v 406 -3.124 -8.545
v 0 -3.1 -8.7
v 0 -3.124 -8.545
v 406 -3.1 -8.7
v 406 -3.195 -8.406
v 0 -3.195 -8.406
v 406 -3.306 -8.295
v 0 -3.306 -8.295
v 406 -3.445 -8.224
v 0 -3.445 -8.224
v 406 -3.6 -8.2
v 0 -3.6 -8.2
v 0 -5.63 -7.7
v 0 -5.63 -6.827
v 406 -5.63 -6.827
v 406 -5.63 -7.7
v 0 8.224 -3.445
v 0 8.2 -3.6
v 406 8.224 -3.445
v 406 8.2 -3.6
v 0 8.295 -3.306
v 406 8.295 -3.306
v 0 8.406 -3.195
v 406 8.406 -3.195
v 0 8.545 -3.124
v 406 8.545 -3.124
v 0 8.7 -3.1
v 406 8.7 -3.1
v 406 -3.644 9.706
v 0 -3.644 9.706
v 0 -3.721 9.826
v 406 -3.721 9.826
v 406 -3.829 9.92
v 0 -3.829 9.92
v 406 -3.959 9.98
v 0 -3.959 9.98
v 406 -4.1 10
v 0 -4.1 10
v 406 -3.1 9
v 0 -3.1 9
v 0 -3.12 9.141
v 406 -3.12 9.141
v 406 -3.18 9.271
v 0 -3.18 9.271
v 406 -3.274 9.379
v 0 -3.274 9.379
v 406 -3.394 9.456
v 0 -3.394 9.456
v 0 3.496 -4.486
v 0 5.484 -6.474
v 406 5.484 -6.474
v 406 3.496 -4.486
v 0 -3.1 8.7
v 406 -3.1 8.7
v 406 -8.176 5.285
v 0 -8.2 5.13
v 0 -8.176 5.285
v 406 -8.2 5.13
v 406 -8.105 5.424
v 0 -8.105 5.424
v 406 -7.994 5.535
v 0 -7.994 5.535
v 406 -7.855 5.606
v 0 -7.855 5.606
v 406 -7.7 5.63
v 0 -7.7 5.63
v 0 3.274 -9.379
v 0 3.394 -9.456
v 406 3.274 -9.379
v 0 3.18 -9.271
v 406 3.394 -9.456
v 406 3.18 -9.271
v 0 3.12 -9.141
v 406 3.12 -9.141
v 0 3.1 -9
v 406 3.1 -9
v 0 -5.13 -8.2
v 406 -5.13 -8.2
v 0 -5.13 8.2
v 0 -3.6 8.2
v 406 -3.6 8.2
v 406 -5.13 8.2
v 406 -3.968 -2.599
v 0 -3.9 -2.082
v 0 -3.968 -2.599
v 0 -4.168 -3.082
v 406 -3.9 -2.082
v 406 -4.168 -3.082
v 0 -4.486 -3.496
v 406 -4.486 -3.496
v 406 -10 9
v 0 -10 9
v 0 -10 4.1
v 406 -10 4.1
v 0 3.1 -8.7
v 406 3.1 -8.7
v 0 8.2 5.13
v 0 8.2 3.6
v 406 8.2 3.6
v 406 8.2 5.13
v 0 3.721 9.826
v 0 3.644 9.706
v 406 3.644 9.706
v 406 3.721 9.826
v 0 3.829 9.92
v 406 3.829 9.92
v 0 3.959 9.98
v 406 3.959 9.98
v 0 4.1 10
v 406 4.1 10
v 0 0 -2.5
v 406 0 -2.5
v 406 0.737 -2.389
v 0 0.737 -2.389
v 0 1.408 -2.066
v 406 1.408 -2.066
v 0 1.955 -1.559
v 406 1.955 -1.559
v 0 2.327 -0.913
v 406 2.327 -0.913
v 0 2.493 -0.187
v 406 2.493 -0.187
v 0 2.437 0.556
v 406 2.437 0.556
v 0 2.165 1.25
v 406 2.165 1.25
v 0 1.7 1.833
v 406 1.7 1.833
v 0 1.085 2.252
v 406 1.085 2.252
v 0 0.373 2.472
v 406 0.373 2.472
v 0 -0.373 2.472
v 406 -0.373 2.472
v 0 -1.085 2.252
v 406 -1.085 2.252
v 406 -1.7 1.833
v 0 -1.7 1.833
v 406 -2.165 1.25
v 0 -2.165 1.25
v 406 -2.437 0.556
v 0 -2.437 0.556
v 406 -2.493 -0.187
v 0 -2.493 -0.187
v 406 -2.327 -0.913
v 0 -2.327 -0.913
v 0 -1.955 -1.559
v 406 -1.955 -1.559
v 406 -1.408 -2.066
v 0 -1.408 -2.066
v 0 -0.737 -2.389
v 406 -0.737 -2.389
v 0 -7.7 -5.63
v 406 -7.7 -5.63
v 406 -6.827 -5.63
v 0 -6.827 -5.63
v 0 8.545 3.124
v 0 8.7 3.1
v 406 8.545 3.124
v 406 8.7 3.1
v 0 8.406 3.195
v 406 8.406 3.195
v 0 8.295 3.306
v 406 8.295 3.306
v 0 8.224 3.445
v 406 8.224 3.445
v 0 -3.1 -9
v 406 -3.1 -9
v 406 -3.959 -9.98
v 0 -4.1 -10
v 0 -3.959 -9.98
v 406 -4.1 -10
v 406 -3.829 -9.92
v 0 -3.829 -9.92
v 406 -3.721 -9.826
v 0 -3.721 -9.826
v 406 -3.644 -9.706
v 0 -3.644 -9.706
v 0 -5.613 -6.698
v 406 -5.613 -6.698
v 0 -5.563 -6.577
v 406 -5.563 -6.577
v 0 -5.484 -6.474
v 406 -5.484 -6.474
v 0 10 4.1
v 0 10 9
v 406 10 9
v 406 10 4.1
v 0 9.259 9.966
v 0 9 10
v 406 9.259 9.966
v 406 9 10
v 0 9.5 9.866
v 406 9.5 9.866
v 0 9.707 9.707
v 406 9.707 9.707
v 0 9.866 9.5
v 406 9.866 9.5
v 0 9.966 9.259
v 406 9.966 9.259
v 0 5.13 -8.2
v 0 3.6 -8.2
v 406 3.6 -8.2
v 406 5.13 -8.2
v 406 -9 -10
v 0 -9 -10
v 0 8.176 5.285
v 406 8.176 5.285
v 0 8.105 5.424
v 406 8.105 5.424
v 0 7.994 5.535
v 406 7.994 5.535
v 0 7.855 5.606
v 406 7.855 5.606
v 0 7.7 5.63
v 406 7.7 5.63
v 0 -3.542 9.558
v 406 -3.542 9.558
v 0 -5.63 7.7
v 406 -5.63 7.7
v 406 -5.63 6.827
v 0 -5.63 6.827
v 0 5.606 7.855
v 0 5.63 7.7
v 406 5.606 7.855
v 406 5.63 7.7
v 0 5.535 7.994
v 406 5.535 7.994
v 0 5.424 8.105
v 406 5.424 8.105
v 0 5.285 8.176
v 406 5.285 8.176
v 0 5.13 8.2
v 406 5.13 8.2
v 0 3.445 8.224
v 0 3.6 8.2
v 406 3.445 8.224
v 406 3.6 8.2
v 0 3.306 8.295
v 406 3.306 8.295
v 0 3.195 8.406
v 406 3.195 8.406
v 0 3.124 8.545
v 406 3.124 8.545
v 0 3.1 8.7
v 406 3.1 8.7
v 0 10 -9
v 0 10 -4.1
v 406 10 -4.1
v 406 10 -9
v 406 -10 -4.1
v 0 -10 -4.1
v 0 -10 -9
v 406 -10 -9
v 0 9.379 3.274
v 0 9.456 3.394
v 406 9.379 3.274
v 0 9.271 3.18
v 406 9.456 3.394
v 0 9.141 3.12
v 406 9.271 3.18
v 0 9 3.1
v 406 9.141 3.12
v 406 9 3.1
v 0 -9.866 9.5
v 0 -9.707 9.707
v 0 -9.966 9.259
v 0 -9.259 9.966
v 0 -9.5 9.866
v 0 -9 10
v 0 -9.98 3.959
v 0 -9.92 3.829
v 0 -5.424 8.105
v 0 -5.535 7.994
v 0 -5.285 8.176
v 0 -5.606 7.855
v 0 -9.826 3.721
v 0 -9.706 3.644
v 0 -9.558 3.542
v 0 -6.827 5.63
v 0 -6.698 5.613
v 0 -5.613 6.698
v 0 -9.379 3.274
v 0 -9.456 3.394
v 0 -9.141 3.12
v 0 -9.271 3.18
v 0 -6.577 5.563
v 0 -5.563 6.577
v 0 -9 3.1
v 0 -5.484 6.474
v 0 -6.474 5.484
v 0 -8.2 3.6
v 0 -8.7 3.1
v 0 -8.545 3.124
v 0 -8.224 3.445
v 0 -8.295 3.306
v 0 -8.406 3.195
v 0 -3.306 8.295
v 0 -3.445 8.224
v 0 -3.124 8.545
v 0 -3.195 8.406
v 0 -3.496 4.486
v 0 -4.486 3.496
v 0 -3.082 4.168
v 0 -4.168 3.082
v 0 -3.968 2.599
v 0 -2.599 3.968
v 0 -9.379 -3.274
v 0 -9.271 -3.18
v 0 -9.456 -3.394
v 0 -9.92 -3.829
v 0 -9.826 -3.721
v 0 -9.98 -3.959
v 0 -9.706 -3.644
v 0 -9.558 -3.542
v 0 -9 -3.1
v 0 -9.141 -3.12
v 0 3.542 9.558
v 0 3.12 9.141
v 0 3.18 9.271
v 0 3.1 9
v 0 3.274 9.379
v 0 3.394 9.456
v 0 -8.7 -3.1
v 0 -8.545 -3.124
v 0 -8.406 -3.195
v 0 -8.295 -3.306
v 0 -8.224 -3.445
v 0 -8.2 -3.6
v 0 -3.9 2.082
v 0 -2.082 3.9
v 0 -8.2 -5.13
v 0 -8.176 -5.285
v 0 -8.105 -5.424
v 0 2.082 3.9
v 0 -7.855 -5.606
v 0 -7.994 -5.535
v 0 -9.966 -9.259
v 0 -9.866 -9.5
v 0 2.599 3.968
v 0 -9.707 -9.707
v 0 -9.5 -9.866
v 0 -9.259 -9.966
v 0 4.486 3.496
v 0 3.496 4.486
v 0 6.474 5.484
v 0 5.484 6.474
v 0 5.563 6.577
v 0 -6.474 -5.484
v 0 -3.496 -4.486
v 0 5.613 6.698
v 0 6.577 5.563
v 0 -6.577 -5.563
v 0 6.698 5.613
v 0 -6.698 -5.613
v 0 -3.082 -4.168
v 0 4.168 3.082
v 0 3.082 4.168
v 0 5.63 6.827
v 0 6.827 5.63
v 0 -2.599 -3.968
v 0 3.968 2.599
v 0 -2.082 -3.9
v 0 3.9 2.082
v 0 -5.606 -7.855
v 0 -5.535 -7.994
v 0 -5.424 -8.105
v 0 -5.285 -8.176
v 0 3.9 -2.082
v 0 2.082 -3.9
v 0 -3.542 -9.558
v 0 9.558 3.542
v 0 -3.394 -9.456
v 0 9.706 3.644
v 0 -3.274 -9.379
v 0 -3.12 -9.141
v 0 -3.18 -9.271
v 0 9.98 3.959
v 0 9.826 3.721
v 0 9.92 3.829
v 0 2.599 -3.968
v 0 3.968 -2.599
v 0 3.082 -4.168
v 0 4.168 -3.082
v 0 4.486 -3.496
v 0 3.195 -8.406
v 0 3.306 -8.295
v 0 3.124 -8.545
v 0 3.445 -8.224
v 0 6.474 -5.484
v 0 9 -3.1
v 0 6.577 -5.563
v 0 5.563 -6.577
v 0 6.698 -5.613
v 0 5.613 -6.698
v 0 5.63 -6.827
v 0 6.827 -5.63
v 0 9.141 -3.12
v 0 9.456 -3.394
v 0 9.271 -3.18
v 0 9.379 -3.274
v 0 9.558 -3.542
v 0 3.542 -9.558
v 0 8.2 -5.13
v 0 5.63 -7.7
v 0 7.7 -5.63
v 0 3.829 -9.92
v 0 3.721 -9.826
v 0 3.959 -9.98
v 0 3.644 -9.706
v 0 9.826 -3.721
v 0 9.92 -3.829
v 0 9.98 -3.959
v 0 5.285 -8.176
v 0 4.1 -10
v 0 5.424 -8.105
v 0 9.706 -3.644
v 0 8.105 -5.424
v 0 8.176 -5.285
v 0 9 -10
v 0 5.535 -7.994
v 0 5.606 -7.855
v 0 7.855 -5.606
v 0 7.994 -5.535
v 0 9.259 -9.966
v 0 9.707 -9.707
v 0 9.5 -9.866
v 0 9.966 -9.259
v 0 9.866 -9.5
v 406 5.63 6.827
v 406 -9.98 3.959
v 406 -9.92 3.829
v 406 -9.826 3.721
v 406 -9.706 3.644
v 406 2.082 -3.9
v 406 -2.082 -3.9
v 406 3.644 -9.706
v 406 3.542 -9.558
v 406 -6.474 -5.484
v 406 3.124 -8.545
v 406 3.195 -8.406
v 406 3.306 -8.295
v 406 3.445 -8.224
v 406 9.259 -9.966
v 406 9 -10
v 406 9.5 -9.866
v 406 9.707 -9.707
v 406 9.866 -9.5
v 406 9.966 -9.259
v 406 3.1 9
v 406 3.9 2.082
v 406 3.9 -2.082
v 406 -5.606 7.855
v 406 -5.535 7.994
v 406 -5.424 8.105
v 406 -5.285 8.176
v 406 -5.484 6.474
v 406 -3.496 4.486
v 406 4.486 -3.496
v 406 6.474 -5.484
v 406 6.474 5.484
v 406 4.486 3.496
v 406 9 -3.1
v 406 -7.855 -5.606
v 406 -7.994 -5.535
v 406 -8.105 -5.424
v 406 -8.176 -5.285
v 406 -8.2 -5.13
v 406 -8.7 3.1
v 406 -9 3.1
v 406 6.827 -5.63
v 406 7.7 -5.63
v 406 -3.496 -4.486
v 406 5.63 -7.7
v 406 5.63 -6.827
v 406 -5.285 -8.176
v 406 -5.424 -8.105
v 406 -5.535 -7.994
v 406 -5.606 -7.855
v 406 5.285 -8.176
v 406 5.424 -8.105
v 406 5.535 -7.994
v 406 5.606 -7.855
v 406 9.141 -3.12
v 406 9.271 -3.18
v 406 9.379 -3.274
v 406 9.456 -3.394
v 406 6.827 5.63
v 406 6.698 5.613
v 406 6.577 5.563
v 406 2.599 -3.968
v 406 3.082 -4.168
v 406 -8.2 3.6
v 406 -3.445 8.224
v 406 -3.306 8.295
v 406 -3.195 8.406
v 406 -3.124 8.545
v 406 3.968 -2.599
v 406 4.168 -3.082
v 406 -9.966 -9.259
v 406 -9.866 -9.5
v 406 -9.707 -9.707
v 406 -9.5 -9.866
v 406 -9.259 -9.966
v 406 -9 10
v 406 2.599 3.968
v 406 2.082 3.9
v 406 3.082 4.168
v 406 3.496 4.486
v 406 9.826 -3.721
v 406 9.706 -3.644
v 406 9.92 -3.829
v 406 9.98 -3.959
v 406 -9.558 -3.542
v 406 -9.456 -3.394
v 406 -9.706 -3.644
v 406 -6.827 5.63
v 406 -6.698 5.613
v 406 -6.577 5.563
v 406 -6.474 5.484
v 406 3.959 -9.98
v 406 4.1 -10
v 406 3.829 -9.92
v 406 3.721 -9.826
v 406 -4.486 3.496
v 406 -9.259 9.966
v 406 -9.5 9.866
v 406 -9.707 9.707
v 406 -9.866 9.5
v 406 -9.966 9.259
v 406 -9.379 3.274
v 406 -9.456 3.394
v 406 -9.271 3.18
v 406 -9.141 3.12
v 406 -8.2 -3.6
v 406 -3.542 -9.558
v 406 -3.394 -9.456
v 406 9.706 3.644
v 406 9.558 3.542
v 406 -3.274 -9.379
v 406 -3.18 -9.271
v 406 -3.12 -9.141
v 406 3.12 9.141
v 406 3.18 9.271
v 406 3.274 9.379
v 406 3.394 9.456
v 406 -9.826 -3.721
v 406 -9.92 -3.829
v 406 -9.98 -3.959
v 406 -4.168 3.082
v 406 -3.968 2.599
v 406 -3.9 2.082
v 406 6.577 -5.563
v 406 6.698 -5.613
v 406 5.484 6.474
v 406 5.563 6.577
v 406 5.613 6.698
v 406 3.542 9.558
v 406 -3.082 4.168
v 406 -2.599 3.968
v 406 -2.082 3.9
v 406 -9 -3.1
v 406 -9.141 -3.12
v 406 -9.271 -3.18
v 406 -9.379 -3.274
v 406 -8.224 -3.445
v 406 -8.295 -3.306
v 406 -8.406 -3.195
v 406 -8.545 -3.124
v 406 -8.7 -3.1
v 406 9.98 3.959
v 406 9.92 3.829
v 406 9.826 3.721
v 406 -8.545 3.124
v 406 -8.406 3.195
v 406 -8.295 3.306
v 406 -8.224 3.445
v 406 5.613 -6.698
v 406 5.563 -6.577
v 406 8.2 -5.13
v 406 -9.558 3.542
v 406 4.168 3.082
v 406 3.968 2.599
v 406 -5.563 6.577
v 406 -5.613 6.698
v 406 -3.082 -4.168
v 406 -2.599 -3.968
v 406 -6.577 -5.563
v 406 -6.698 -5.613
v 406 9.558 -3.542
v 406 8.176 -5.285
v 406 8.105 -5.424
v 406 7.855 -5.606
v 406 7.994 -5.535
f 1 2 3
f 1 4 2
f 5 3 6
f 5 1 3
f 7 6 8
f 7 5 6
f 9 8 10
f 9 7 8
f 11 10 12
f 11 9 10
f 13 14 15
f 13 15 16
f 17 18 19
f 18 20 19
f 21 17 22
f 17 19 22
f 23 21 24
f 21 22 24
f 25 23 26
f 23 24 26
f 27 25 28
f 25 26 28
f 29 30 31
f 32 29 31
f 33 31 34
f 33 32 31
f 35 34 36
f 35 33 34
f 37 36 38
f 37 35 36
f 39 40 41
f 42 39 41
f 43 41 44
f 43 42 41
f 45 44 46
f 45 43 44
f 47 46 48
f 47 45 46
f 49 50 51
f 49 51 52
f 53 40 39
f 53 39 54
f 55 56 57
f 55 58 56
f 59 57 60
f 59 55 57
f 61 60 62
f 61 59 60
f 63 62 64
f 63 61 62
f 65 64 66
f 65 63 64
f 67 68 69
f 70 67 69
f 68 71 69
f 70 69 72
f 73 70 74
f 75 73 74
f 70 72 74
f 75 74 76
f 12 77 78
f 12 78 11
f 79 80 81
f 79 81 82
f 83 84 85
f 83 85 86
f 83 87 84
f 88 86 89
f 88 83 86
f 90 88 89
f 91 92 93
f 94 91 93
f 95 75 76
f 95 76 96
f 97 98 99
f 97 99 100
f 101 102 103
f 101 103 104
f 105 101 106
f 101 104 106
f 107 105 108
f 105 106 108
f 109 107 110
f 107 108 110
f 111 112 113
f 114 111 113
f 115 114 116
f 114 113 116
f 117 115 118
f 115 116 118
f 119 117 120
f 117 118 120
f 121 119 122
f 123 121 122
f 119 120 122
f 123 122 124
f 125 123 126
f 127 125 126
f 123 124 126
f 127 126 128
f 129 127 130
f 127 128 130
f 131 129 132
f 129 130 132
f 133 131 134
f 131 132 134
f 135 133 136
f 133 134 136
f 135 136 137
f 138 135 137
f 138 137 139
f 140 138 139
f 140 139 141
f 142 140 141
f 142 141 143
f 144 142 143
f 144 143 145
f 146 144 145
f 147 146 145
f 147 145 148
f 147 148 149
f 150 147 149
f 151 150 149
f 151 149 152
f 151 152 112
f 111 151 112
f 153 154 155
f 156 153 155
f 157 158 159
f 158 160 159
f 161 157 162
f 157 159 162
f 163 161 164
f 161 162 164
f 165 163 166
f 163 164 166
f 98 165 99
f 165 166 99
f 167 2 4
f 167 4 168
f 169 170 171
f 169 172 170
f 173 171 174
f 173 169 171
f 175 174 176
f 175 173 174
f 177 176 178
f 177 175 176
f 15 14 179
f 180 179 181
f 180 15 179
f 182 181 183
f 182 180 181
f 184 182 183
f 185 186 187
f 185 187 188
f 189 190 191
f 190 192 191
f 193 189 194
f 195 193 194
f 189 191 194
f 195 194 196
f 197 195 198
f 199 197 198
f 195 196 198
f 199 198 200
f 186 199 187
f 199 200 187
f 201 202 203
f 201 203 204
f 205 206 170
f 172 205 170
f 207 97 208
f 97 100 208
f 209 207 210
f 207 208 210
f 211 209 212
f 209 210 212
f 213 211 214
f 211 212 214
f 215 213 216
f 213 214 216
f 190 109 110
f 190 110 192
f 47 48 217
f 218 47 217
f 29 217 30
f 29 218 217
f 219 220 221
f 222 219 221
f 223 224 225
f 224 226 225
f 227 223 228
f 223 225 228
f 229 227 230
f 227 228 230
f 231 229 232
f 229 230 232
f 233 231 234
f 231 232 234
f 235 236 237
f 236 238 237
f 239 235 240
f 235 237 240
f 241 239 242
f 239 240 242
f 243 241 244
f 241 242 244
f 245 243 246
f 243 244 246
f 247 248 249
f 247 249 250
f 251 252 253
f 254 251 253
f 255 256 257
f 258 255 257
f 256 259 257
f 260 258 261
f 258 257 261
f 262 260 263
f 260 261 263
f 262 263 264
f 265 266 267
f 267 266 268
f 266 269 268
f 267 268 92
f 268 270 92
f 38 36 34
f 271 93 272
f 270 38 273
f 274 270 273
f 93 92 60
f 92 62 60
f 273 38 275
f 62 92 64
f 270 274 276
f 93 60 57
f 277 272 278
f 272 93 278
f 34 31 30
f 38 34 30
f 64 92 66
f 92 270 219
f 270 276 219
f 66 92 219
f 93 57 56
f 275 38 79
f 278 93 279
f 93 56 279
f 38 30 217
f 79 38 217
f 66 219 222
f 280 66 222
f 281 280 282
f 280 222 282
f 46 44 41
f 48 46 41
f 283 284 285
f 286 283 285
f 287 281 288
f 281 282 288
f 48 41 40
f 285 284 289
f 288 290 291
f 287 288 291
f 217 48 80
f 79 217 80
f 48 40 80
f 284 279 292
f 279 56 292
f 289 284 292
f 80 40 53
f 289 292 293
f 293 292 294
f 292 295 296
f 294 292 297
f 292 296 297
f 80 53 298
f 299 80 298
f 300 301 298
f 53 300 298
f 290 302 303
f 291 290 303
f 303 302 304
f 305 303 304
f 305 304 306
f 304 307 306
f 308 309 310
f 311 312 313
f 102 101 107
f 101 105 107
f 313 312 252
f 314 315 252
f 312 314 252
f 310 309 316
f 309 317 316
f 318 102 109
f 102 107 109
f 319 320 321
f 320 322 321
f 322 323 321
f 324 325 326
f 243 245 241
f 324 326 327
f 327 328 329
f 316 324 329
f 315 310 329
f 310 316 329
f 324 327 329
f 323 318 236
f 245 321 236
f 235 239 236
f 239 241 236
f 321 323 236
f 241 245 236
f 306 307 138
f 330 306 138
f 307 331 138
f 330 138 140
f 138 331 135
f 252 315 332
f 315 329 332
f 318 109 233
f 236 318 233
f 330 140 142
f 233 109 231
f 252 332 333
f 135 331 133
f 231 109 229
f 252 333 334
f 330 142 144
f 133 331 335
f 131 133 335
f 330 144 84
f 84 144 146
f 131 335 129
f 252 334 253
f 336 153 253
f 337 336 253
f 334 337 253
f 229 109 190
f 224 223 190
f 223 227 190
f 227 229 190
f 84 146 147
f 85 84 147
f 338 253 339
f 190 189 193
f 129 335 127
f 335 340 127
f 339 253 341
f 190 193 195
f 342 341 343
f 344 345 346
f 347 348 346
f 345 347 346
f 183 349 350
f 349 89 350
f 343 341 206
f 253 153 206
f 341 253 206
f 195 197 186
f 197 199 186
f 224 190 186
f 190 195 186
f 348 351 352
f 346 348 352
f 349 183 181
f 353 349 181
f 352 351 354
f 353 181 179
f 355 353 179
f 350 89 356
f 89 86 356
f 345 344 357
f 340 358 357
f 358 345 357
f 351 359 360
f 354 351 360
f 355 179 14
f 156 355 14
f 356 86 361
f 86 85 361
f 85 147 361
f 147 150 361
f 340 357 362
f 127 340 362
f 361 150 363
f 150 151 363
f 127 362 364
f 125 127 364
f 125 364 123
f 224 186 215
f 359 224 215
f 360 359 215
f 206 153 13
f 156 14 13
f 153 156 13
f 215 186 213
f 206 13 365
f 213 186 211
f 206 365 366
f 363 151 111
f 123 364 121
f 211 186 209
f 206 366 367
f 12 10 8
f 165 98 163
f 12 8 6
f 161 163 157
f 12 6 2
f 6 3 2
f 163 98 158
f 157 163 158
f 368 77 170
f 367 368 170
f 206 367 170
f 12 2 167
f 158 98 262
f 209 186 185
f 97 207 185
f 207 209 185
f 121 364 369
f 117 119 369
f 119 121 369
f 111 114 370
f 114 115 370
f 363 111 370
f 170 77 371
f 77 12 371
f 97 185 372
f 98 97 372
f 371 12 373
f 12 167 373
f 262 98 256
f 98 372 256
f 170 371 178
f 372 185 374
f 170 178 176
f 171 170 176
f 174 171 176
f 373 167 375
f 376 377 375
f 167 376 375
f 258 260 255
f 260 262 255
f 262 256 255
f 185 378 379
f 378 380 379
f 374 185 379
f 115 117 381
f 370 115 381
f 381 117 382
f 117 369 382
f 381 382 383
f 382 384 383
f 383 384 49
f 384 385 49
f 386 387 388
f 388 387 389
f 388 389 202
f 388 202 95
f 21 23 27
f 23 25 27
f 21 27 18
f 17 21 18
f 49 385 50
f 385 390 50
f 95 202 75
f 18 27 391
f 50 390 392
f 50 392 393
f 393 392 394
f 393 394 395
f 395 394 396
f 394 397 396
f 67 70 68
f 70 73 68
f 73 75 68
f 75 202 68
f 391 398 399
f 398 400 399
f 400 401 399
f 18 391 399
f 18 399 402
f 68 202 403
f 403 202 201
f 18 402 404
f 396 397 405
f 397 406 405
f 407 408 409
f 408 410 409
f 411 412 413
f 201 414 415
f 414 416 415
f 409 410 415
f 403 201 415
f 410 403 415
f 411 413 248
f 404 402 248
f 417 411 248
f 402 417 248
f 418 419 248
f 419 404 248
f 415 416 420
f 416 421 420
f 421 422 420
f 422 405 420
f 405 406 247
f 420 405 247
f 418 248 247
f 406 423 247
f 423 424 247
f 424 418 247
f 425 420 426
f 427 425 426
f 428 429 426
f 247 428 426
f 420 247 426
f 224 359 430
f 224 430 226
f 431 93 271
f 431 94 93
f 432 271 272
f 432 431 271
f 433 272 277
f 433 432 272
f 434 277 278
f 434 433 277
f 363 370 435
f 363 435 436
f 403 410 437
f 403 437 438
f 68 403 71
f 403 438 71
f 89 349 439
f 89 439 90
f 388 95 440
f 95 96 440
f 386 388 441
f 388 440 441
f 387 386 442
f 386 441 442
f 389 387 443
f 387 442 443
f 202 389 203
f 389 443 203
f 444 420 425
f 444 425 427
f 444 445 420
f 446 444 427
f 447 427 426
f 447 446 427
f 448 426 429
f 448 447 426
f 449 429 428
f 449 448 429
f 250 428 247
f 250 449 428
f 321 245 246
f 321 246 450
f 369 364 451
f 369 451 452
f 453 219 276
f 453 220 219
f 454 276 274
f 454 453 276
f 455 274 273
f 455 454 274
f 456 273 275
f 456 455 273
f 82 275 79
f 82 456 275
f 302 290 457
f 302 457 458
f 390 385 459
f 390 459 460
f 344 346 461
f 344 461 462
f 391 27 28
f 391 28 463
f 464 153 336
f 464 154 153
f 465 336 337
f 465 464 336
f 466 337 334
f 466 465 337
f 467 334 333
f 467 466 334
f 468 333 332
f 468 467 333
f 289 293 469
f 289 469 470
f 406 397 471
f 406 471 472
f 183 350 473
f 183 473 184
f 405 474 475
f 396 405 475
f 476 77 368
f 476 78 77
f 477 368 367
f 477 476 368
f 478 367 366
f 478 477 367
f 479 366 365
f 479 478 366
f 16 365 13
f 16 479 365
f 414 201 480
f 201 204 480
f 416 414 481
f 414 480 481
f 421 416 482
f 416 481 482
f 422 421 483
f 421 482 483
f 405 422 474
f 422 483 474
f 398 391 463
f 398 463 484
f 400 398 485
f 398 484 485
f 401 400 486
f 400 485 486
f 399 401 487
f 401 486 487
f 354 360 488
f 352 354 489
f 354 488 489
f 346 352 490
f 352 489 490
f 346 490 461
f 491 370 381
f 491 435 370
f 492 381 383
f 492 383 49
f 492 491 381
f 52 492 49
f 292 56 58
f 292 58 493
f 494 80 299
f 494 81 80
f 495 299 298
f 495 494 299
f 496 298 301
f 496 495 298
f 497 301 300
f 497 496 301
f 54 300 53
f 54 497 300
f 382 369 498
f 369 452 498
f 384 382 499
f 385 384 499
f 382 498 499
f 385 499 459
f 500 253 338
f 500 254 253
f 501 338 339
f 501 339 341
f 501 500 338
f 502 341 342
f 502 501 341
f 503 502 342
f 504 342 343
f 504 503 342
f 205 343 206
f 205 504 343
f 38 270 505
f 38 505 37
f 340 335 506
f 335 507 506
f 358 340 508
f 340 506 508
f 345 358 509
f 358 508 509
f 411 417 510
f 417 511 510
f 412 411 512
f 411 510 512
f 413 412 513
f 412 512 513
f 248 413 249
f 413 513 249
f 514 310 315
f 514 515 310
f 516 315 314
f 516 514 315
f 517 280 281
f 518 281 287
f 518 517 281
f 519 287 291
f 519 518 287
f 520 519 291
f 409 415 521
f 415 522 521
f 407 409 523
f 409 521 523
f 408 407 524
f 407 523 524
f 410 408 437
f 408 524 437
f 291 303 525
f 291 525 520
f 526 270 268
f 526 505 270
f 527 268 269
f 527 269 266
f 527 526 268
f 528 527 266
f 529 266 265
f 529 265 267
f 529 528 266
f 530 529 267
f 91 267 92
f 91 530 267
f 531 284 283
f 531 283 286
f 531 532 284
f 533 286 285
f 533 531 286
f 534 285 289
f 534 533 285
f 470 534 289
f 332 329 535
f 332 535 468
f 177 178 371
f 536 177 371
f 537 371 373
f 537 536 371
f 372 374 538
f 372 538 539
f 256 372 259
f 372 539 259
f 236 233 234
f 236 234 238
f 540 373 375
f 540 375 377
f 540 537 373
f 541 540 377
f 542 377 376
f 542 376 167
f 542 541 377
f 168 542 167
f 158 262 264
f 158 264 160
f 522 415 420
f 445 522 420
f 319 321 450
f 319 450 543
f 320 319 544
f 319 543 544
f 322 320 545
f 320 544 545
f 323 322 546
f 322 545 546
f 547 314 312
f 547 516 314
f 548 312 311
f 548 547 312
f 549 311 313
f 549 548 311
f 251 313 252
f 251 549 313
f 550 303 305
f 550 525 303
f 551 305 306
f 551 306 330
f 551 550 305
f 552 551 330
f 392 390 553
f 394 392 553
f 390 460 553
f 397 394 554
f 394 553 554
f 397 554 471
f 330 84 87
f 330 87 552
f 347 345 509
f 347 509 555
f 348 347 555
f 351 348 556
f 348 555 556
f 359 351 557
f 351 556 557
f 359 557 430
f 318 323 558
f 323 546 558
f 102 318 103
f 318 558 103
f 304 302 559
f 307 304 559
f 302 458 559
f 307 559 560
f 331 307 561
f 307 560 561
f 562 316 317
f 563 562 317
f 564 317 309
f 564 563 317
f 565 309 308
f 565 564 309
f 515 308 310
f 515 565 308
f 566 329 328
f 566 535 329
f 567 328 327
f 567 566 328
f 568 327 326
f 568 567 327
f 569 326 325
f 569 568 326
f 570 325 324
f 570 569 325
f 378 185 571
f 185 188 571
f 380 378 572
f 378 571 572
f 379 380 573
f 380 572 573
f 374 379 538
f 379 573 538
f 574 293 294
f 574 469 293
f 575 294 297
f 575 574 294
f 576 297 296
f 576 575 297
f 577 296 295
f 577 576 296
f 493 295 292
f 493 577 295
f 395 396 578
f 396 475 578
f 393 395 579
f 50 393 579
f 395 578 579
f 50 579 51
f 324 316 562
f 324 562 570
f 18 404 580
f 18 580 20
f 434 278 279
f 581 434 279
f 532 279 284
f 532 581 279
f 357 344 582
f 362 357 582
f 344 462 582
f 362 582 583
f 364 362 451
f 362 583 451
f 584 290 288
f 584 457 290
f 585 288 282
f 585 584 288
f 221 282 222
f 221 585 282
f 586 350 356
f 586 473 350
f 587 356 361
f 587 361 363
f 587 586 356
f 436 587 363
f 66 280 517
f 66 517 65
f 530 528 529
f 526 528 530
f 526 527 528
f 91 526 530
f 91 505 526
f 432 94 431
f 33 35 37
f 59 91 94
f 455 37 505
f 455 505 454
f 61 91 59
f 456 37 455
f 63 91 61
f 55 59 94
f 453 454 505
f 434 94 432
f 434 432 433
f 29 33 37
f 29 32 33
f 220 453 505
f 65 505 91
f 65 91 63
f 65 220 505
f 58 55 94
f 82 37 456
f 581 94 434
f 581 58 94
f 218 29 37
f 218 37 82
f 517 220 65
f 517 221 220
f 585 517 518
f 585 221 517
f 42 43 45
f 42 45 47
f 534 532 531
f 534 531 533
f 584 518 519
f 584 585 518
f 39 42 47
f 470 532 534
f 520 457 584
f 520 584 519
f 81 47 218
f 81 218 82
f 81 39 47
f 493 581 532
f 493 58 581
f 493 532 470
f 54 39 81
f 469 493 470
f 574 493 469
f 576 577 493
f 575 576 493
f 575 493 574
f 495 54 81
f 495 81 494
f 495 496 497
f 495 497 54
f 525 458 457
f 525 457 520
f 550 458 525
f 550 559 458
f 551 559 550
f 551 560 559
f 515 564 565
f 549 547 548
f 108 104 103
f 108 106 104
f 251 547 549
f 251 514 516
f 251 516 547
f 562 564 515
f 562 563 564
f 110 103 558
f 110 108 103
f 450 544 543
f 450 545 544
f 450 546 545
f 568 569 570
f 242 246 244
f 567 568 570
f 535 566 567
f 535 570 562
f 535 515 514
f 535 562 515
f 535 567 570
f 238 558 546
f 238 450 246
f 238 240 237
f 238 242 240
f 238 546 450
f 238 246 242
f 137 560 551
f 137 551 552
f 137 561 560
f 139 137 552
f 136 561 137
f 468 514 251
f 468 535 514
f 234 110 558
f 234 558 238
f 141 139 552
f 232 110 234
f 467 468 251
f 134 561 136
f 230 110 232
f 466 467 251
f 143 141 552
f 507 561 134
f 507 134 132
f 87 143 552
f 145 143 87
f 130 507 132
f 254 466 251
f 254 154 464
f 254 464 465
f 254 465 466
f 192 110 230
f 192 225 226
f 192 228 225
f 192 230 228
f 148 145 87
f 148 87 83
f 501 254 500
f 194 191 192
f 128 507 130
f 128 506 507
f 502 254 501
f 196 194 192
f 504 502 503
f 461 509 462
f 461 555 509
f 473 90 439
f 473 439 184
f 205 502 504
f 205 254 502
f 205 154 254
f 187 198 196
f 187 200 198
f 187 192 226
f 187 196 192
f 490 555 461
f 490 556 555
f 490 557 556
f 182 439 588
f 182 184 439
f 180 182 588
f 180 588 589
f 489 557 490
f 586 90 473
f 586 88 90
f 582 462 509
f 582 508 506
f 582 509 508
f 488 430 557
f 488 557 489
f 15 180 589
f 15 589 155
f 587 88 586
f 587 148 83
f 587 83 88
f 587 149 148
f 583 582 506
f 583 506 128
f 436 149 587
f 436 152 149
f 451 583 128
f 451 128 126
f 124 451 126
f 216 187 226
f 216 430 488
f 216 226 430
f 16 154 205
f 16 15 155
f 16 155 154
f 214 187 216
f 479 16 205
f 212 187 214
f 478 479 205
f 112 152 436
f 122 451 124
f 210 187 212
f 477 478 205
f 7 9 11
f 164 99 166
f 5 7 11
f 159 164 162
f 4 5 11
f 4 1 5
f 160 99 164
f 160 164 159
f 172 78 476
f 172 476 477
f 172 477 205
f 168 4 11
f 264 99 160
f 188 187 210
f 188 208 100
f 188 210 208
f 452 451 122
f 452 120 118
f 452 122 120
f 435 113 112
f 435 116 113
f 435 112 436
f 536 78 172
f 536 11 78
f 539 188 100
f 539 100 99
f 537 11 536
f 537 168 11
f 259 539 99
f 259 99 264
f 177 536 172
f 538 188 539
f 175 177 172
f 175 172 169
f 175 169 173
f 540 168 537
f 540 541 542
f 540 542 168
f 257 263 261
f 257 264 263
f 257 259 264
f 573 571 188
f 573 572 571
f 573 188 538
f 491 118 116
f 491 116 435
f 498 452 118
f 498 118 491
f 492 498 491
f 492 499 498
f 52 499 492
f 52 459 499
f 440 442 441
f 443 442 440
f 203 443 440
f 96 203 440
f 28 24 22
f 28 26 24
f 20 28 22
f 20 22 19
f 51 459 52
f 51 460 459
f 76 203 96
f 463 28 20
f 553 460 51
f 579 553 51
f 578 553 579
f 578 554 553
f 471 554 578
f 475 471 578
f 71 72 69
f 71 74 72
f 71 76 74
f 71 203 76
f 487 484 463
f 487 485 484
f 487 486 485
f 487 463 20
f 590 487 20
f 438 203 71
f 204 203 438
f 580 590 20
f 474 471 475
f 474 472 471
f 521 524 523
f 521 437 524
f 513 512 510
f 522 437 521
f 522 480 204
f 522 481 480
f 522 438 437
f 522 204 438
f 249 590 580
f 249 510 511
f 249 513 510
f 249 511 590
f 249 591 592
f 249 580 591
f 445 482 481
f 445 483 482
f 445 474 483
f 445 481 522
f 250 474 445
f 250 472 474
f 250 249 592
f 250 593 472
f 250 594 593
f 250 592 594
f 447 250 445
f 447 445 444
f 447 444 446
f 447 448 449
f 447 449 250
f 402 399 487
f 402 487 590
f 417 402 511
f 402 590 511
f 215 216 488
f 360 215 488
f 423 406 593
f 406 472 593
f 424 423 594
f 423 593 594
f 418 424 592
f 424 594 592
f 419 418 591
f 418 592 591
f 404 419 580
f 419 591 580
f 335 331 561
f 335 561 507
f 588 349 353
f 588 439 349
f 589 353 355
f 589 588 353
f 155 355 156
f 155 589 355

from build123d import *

# Parameters (mm, degrees)
SKETCH1_W                = 20
SKETCH1_H                = 20
BOSS_EXTRUDE1_DEPTH      = 406
FILLET1_R                = 1
CUT_EXTRUDE1_DEPTH       = 407.246230752
F_5_0_5_DIAMETER_HOLE1_D = 5
FILLET2_R                = 2
FILLET3_R                = 0.5
FILLET4_R                = 0.5
FILLET5_R                = 0.5


with BuildPart() as part:
    # Sketch1 → Boss-Extrude1 (new body)
    with BuildSketch(Plane(origin=(0, 0, 0), x_dir=(0, 0, -1), z_dir=(1, 0, 0))):
        Rectangle(SKETCH1_W, SKETCH1_H)
    extrude(amount=BOSS_EXTRUDE1_DEPTH)

    # Fillet1
    fillet1_edges = [part.edges().sort_by_distance(p)[0] for p in [
        (203, 10, 10),
        (203, 10, -10),
        (203, -10, -10),
        (203, -10, 10),
    ]]
    fillet(fillet1_edges, radius=FILLET1_R)

    # Sketch3 → Cut-Extrude1 (cut, through all)
    with BuildSketch(Plane.ZY):
        Polygon((-3.6, 10), (3.6, 10), (3.6, 9.5), (3.1, 9.5), (3.1, 8.2), (5.63, 8.2), (5.63, 6.619949494), (2.910050506, 3.9), (-2.910050506, 3.9), (-5.63, 6.619949494), (-5.63, 8.2), (-3.1, 8.2), (-3.1, 9.5), (-3.6, 9.5), align=None)
        Polygon((10, 3.6), (10, -3.6), (9.5, -3.6), (9.5, -3.1), (8.2, -3.1), (8.2, -5.63), (6.619949494, -5.63), (3.9, -2.910050506), (3.9, 2.910050506), (6.619949494, 5.63), (8.2, 5.63), (8.2, 3.1), (9.5, 3.1), (9.5, 3.6), align=None)
        Polygon((3.6, -10), (-3.6, -10), (-3.6, -9.5), (-3.1, -9.5), (-3.1, -8.2), (-5.63, -8.2), (-5.63, -6.619949494), (-2.910050506, -3.9), (2.910050506, -3.9), (5.63, -6.619949494), (5.63, -8.2), (3.1, -8.2), (3.1, -9.5), (3.6, -9.5), align=None)
        Polygon((-10, -3.6), (-10, 3.6), (-9.5, 3.6), (-9.5, 3.1), (-8.2, 3.1), (-8.2, 5.63), (-6.619949494, 5.63), (-3.9, 2.910050506), (-3.9, -2.910050506), (-6.619949494, -5.63), (-8.2, -5.63), (-8.2, -3.1), (-9.5, -3.1), (-9.5, -3.6), align=None)
    extrude(amount=-CUT_EXTRUDE1_DEPTH, mode=Mode.SUBTRACT)

    # Ø5.0 (5) Diameter Hole1 (through all)
    with Locations(Plane.ZY):
        with Locations((0, 0)):
            Hole(F_5_0_5_DIAMETER_HOLE1_D / 2)

    # Fillet2
    fillet2_edges = [part.edges().sort_by_distance(p)[0] for p in [
        (203, -3.9, -2.910050506),
        (203, -3.9, 2.910050506),
        (203, 2.910050506, -3.9),
        (203, -2.910050506, -3.9),
        (203, -2.910050506, 3.9),
        (203, 2.910050506, 3.9),
        (203, 3.9, 2.910050506),
        (203, 3.9, -2.910050506),
    ]]
    fillet(fillet2_edges, radius=FILLET2_R)

    # Fillet3
    fillet3_edges = [part.edges().sort_by_distance(p)[0] for p in [
        (203, 3.6, -10),
        (203, 3.1, -9.5),
        (203, 3.1, -8.2),
        (203, 5.63, -8.2),
        (203, 5.63, -6.619949494),
        (203, 3.6, 10),
        (203, 3.1, 9.5),
        (203, 3.1, 8.2),
        (203, 5.63, 8.2),
        (203, 5.63, 6.619949494),
        (203, 6.619949494, 5.63),
        (203, 8.2, 5.63),
        (203, 8.2, 3.1),
        (203, 9.5, 3.1),
        (203, 10, 3.6),
        (203, 9.5, -3.1),
        (203, 10, -3.6),
        (203, 8.2, -3.1),
        (203, 8.2, -5.63),
        (203, 6.619949494, -5.63),
    ]]
    fillet(fillet3_edges, radius=FILLET3_R - 0.0001)  # a hair under: the kernel refuses the full size

    # Fillet4
    fillet4_edges = [part.edges().sort_by_distance(p)[0] for p in [
        (203, -3.6, 10),
        (203, -3.1, 9.5),
        (203, -3.1, 8.2),
        (203, -5.63, 8.2),
        (203, -5.63, 6.619949494),
        (203, -6.619949494, 5.63),
        (203, -8.2, 5.63),
        (203, -8.2, 3.1),
        (203, -10, 3.6),
        (203, -9.5, 3.1),
        (203, -10, -3.6),
        (203, -9.5, -3.1),
        (203, -8.2, -3.1),
        (203, -8.2, -5.63),
        (203, -6.619949494, -5.63),
        (203, -5.63, -6.619949494),
        (203, -5.63, -8.2),
        (203, -3.1, -8.2),
        (203, -3.1, -9.5),
        (203, -3.6, -10),
    ]]
    fillet(fillet4_edges, radius=FILLET4_R - 0.0001)  # a hair under: the kernel refuses the full size

    # Fillet5
    fillet5_edges = [part.edges().sort_by_distance(p)[0] for p in [
        (203, 3.6, 9.5),
        (203, 9.5, 3.6),
        (203, 9.5, -3.6),
        (203, 3.6, -9.5),
        (203, -3.6, 9.5),
        (203, -9.5, 3.6),
        (203, -9.5, -3.6),
        (203, -3.6, -9.5),
    ]]
    fillet(fillet5_edges, radius=FILLET5_R)


solid = part.part
